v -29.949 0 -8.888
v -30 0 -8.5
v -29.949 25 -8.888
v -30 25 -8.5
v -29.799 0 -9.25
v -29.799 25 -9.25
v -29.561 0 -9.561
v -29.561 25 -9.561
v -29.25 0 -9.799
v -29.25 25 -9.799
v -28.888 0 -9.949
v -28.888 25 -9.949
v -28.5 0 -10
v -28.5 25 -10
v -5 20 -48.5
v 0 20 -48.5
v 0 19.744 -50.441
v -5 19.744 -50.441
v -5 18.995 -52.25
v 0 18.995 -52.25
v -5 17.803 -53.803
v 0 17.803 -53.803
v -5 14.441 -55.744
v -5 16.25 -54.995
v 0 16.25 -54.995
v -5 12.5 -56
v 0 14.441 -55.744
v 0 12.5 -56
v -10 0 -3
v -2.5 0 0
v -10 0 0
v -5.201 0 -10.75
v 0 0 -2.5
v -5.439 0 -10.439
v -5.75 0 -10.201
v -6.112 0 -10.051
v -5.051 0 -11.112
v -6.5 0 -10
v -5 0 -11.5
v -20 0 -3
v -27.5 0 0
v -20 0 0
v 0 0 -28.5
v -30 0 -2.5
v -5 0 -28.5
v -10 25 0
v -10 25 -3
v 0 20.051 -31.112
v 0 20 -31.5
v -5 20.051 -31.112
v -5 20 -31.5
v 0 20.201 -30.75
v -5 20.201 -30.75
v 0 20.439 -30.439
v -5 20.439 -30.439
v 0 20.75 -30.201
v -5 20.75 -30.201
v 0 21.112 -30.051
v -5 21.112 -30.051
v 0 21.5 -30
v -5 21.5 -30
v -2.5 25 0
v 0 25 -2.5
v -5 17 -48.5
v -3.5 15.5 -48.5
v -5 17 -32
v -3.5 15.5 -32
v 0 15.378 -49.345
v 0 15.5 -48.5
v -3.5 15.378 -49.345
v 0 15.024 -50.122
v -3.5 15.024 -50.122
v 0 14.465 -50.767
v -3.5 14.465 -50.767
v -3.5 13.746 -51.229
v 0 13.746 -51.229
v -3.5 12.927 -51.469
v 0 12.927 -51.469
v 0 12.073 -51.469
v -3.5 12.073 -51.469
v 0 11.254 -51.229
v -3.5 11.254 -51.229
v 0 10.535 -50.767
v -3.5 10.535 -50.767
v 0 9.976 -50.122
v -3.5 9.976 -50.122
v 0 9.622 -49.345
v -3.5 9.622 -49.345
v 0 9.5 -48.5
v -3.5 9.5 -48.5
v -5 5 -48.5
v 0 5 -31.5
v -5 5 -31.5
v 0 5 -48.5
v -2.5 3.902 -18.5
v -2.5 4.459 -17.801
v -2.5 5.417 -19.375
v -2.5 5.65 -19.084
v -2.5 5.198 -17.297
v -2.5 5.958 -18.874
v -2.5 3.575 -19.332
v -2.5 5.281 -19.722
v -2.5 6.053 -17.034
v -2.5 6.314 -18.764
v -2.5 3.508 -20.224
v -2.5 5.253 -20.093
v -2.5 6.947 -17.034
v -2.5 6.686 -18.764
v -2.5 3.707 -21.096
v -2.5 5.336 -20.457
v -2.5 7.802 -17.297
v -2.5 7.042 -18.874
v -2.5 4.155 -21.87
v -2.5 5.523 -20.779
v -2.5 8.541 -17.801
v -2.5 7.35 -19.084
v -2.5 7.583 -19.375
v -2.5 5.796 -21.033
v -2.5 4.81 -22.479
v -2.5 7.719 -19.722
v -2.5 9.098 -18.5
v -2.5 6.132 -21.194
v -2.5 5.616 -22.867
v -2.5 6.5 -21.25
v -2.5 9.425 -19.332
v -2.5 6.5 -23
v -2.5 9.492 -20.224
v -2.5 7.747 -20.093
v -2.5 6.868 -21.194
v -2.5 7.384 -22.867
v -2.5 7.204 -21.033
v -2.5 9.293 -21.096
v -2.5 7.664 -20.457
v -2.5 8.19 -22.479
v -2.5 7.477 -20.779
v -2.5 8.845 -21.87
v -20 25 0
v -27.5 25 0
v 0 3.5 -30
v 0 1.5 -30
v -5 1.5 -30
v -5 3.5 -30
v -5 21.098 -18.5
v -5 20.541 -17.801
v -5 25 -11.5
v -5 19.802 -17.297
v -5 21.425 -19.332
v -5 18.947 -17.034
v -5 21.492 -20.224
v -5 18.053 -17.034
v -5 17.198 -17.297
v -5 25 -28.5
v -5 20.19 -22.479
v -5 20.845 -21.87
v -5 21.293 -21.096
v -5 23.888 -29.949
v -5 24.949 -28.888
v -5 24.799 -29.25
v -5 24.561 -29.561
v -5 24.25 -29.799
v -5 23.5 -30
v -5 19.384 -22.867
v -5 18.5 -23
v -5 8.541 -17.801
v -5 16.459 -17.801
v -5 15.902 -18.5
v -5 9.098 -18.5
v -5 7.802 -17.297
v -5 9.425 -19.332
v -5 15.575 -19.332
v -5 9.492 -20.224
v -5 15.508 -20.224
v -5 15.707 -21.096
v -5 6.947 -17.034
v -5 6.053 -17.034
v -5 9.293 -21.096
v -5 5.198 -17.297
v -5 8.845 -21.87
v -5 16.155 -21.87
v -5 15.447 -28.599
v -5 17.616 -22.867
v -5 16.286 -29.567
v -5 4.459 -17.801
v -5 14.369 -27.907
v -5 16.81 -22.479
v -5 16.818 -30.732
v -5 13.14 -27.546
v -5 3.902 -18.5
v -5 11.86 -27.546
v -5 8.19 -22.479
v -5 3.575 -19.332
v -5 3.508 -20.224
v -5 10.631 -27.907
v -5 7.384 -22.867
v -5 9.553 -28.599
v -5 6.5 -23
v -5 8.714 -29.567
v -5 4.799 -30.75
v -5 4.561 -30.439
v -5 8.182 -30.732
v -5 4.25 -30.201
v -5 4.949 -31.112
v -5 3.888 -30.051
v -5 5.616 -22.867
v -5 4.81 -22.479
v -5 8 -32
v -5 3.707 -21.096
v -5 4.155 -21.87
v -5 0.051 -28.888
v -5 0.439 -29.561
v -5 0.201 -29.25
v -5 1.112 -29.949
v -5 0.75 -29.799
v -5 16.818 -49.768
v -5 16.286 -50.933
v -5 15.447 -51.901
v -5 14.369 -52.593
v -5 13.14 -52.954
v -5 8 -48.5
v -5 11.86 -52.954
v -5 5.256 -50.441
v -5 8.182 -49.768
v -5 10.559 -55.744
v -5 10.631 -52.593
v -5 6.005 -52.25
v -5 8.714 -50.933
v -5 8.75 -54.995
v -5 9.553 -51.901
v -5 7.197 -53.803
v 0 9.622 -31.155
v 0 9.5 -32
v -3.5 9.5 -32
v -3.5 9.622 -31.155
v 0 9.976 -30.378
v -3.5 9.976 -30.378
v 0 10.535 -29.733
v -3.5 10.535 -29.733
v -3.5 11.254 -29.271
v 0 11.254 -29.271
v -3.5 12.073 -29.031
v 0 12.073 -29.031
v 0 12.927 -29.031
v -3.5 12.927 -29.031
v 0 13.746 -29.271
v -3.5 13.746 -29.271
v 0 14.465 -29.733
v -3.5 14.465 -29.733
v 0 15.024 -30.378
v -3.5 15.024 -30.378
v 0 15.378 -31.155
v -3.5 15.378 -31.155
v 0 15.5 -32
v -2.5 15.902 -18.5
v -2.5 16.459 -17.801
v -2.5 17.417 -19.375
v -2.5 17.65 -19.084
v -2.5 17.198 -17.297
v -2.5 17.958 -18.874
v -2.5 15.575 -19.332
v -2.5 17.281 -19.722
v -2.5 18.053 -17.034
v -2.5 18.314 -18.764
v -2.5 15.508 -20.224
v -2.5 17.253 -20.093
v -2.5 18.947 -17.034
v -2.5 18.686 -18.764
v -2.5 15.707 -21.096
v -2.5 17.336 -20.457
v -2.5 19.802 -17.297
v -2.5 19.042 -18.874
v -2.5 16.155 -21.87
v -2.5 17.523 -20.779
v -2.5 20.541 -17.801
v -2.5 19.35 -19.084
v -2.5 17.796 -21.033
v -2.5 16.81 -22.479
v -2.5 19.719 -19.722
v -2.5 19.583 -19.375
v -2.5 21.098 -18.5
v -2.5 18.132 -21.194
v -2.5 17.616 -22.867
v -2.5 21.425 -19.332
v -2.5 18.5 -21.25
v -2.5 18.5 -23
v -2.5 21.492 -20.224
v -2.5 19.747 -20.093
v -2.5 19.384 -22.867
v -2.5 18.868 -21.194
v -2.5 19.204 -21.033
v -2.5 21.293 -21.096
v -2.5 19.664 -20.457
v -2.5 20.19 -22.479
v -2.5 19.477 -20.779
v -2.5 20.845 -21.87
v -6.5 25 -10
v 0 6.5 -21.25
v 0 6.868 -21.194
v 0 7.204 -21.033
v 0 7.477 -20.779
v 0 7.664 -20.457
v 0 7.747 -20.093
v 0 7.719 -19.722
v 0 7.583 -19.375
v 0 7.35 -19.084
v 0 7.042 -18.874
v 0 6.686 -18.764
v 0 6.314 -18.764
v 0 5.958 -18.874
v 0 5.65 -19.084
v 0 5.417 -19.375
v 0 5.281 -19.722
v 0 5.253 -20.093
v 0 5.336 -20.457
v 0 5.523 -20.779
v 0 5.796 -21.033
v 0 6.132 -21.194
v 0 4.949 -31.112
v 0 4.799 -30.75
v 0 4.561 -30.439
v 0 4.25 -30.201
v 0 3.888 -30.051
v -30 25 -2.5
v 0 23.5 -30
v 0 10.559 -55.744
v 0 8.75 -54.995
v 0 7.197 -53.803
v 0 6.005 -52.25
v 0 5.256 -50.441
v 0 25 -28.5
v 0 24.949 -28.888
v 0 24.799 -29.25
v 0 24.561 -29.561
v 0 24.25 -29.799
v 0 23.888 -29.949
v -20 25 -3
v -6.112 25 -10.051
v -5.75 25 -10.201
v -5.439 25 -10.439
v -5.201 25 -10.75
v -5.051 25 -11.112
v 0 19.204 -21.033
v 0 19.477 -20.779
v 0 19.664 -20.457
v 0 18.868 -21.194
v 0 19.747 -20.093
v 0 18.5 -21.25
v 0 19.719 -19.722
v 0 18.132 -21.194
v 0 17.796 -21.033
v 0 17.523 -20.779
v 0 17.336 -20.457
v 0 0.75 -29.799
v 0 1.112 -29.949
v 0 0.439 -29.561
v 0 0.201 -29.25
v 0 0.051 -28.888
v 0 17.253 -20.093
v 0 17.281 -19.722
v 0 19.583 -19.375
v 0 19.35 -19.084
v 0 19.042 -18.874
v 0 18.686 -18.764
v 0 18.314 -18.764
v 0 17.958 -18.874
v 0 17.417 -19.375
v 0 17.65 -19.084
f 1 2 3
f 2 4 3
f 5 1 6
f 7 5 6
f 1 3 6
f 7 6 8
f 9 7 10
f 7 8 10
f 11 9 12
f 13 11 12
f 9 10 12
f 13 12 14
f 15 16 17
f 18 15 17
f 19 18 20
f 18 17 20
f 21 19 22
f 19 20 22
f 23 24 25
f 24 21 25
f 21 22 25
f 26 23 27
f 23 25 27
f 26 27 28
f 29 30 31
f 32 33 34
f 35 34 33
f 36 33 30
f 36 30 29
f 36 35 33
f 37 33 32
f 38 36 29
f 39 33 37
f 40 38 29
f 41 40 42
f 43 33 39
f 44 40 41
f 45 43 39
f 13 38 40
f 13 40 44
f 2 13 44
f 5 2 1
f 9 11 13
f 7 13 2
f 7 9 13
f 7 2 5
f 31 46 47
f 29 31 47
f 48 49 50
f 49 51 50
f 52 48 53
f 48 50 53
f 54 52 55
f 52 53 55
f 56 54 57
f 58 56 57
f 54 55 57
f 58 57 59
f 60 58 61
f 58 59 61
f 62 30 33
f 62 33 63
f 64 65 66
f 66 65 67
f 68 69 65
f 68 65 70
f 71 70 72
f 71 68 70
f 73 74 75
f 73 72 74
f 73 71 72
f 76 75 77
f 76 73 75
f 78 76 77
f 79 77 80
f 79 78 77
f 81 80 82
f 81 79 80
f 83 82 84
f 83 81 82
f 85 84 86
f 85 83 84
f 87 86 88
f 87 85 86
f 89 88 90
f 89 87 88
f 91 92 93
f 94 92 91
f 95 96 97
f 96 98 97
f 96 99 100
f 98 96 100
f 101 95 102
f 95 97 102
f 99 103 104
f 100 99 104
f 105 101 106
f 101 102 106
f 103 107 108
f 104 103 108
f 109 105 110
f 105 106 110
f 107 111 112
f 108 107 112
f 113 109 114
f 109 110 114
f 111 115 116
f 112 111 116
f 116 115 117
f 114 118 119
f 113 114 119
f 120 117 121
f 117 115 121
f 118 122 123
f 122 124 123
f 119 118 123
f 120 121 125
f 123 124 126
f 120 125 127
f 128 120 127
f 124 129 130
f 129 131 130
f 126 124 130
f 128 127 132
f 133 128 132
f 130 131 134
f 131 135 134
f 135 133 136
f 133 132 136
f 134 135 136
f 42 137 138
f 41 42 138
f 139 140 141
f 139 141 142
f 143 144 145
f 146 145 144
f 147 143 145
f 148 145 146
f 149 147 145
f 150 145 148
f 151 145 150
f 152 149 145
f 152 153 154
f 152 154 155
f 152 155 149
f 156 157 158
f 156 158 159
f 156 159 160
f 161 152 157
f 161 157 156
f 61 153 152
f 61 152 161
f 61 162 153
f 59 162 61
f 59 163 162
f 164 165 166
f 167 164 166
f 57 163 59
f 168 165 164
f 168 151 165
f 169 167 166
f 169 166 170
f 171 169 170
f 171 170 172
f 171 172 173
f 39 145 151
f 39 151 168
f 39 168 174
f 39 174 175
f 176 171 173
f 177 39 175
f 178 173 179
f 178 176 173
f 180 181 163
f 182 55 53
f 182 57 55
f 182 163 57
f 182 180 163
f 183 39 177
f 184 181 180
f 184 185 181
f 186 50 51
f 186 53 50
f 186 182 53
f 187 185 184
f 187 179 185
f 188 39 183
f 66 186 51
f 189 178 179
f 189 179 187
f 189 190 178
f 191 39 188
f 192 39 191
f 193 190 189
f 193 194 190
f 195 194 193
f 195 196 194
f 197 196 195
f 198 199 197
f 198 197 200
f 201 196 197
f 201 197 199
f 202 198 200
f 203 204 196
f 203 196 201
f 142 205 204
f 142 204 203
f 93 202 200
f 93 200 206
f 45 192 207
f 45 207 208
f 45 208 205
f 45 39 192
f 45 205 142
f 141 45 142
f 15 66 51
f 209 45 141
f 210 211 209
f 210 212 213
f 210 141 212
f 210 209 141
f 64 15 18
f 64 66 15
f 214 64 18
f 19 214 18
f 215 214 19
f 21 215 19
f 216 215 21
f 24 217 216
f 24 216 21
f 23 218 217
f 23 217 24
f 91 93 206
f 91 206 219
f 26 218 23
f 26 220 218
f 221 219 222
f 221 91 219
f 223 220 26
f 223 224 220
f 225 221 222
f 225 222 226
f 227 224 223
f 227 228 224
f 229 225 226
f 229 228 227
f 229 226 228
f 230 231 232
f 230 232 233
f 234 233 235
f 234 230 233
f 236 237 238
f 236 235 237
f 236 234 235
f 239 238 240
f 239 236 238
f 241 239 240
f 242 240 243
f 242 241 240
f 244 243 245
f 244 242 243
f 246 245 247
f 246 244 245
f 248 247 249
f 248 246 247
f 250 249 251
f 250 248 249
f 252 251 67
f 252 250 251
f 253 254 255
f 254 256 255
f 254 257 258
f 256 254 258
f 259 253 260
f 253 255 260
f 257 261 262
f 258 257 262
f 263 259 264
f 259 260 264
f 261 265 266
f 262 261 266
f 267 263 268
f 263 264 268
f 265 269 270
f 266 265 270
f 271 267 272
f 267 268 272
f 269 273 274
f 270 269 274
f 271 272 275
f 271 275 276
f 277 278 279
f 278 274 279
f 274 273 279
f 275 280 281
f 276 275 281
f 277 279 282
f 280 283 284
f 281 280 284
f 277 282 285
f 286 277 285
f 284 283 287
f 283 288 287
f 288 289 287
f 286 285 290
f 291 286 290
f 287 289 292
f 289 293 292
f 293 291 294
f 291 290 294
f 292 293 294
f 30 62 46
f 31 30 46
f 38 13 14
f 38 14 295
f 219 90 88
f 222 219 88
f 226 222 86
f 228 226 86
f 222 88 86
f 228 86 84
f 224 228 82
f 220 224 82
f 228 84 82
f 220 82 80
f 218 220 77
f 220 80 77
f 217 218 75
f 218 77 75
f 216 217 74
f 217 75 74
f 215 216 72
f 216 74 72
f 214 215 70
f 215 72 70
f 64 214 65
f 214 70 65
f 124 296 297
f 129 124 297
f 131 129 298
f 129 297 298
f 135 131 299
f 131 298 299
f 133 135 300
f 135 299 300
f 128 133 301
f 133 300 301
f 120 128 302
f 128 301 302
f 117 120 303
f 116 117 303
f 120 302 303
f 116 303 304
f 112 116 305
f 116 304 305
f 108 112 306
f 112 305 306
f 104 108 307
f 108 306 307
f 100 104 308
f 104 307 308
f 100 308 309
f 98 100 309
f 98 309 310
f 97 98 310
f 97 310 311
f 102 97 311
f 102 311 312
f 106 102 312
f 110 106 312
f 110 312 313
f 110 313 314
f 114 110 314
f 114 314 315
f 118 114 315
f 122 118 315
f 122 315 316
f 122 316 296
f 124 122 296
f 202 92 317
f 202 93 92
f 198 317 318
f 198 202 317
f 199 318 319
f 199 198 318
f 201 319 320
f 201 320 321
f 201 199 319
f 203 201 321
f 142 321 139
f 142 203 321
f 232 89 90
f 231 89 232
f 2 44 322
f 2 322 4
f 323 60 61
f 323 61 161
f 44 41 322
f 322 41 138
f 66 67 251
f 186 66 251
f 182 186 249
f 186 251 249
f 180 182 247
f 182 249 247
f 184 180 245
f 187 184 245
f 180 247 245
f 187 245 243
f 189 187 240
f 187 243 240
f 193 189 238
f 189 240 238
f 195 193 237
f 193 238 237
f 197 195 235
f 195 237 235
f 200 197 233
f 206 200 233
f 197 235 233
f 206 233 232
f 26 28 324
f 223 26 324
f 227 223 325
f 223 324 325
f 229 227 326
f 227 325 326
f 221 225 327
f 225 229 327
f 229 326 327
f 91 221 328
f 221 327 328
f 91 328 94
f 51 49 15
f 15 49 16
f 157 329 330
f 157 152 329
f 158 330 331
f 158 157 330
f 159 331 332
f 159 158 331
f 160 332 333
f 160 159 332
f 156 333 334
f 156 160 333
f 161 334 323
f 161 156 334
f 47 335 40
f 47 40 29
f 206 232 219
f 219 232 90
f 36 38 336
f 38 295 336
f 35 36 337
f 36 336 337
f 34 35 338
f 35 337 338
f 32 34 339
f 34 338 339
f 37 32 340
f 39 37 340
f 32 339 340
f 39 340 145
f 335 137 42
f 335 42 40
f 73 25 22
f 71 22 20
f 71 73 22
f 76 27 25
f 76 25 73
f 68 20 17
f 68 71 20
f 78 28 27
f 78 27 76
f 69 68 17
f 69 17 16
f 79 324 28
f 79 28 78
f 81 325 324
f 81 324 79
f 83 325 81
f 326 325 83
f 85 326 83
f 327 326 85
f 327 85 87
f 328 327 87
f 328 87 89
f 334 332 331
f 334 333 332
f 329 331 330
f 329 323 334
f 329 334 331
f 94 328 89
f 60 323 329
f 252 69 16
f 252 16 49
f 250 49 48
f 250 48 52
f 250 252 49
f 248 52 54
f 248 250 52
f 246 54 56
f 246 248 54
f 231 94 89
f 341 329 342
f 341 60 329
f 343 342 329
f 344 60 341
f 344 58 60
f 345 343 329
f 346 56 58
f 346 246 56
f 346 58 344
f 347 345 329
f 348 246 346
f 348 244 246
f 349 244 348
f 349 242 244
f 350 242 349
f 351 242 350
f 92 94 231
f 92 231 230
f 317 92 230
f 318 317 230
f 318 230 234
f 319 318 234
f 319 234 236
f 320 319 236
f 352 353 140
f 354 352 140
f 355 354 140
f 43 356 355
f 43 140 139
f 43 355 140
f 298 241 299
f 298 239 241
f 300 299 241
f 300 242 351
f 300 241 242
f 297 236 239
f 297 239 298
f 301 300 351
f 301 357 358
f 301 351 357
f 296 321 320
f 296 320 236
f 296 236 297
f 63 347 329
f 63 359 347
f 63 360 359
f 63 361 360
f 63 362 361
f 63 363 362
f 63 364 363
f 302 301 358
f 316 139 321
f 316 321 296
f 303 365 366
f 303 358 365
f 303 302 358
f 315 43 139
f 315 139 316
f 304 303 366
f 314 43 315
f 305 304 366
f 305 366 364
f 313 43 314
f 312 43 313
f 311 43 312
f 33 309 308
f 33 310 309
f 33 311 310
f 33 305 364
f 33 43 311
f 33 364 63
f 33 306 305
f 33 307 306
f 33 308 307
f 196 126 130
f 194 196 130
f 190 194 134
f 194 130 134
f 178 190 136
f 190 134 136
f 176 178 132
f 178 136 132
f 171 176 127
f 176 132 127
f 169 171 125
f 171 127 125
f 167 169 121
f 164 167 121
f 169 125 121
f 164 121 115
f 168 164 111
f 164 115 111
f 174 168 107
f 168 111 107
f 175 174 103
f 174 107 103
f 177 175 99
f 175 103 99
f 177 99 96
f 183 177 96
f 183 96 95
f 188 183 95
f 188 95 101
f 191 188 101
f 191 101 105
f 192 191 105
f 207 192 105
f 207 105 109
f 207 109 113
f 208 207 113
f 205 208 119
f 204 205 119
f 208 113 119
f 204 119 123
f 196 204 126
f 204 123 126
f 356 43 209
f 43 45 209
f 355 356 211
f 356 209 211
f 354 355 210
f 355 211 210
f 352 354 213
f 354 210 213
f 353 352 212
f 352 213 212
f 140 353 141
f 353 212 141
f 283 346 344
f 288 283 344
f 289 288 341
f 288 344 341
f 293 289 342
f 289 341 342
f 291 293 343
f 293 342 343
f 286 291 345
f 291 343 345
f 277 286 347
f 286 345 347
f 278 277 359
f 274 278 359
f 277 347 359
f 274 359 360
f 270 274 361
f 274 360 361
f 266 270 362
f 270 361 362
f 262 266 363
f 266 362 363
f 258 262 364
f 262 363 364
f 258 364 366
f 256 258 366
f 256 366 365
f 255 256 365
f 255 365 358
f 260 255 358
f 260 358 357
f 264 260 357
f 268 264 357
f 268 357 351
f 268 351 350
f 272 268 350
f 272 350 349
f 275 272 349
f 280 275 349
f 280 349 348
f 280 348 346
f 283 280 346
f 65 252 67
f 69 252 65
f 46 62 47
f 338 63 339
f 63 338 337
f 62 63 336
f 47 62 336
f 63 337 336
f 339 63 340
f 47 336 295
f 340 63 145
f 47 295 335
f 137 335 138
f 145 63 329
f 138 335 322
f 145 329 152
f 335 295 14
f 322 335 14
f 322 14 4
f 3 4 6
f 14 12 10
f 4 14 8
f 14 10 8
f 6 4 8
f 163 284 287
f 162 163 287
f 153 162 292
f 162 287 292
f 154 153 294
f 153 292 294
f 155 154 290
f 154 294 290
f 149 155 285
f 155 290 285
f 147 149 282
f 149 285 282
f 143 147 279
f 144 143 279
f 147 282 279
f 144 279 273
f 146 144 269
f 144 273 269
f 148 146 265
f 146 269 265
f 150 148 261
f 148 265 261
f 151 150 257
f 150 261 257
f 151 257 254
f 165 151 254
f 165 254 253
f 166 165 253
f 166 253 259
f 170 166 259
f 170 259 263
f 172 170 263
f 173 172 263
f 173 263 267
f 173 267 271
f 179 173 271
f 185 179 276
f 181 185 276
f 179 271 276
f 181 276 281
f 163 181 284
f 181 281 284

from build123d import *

# Parameters (mm, degrees)
BOSS_EXTRUDE1_DEPTH = 25
CUT_EXTRUDE1_DEPTH  = 25
CUT_EXTRUDE2_DEPTH  = 25
FILLET1_R           = 1.5
SKETCH5_R           = 1.25
CUT_EXTRUDE4_DEPTH  = 25
CUT_EXTRUDE5_START  = -2.5
SKETCH5_4_R         = 3
SKETCH5_4_R_2       = 1.25
CUT_EXTRUDE5_DEPTH  = 2.5
SKETCH7_W           = 10
SKETCH7_H           = 3
CUT_EXTRUDE6_DEPTH  = 69.271516755
CHAMFER1_SIZE       = 2.5
FILLET2_R           = 1.5
CHAMFER2_SIZE       = 1.5


with BuildPart() as part:
    # Sketch1 → Boss-Extrude1 (new body)
    with BuildSketch(Plane(origin=(0, 0, 0), x_dir=(1, 0, 0), z_dir=(0, 1, 0))):
        Polygon((0, 0), (-30, 0), (-30, 10), (-5, 10), (-5, 56), (0, 56), align=None)
    extrude(amount=BOSS_EXTRUDE1_DEPTH)

    # Sketch2 → Cut-Extrude1 (cut)
    with BuildSketch(Plane(origin=(0, 0, 0), x_dir=(0, 0, -1), z_dir=(1, 0, 0))):
        with BuildLine():
            Line((56, 25), (30, 25))
            Line((30, 25), (30, 20))
            Line((30, 20), (48.5, 20))
            ThreePointArc((48.5, 20), (53.803300859, 17.803300859), (56, 12.5))
            Line((56, 12.5), (56, 25))
        make_face()
        with BuildLine():
            ThreePointArc((56, 12.5), (53.803300859, 7.196699141), (48.5, 5))
            Line((48.5, 5), (30, 5))
            Line((30, 5), (30, 0))
            Line((30, 0), (56, 0))
            Line((56, 0), (56, 12.5))
        make_face()
    extrude(amount=-CUT_EXTRUDE1_DEPTH, mode=Mode.SUBTRACT)

    # Sketch3 → Cut-Extrude2 (cut)
    with BuildSketch(Plane(origin=(0, 0, 0), x_dir=(0, 0, -1), z_dir=(1, 0, 0))):
        with BuildLine():
            Line((32, 15.5), (48.5, 15.5))
            ThreePointArc((48.5, 15.5), (51.5, 12.5), (48.5, 9.5))
            Line((48.5, 9.5), (32, 9.5))
            ThreePointArc((32, 9.5), (29, 12.5), (32, 15.5))
        make_face()
    extrude(amount=-CUT_EXTRUDE2_DEPTH, mode=Mode.SUBTRACT)

    # Fillet1
    fillet1_edges = [part.edges().sort_by_distance(p)[0] for p in [
        (-2.5, 20, -30),
        (-2.5, 5, -30),
        (-2.5, 0, -30),
        (-2.5, 25, -30),
    ]]
    fillet(fillet1_edges, radius=FILLET1_R)

    # Sketch5 → Cut-Extrude4 (cut)
    with BuildSketch(Plane(origin=(0, 0, 0), x_dir=(0, 0, -1), z_dir=(1, 0, 0))):
        with Locations((20, 18.5)):
            Circle(SKETCH5_R)
        with Locations((20, 6.5)):
            Circle(SKETCH5_R)
    extrude(amount=-CUT_EXTRUDE4_DEPTH, mode=Mode.SUBTRACT)

    # Sketch5<4> → Cut-Extrude5 (cut)
    # profile 1 of 2: a face of its own
    with BuildSketch(Plane(origin=(0, 0, 0), x_dir=(0, 0, -1), z_dir=(1, 0, 0)).offset(CUT_EXTRUDE5_START)):
        with Locations((20, 18.5)):
            Circle(SKETCH5_4_R)
        with Locations((20, 18.5)):
            Circle(SKETCH5_4_R_2, mode=Mode.SUBTRACT)
    # profile 2 of 2: a face of its own
    with BuildSketch(Plane(origin=(0, 0, 0), x_dir=(0, 0, -1), z_dir=(1, 0, 0)).offset(CUT_EXTRUDE5_START)):
        with Locations((20, 6.5)):
            Circle(SKETCH5_4_R)
        with Locations((20, 6.5)):
            Circle(SKETCH5_4_R_2, mode=Mode.SUBTRACT)
    extrude(amount=-CUT_EXTRUDE5_DEPTH, mode=Mode.SUBTRACT)

    # Sketch7 → Cut-Extrude6 (cut, through all)
    with BuildSketch(Plane(origin=(0, 25, 0), x_dir=(1, 0, 0), z_dir=(0, 1, 0))):
        with Locations((-15, 1.5)):
            Rectangle(SKETCH7_W, SKETCH7_H)
    extrude(amount=-CUT_EXTRUDE6_DEPTH, mode=Mode.SUBTRACT)

    # Chamfer1
    chamfer1_edges = [part.edges().sort_by_distance(p)[0] for p in [
        (0, 12.5, 0),
        (-30, 12.5, 0),
    ]]
    chamfer(chamfer1_edges, length=CHAMFER1_SIZE)

    # Fillet2
    fillet2_edges = [part.edges().sort_by_distance(p)[0] for p in [
        (-30, 12.5, -10),
        (-5, 12.5, -10),
    ]]
    fillet(fillet2_edges, radius=FILLET2_R)

    # Chamfer2
    chamfer2_edges = [part.edges().sort_by_distance(p)[0] for p in [
        (-5, 9.5, -40.25),
        (-5, 12.5, -51.5),
        (-5, 12.5, -29),
        (-5, 15.5, -40.25),
    ]]
    chamfer(chamfer2_edges, length=CHAMFER2_SIZE)


solid = part.part
